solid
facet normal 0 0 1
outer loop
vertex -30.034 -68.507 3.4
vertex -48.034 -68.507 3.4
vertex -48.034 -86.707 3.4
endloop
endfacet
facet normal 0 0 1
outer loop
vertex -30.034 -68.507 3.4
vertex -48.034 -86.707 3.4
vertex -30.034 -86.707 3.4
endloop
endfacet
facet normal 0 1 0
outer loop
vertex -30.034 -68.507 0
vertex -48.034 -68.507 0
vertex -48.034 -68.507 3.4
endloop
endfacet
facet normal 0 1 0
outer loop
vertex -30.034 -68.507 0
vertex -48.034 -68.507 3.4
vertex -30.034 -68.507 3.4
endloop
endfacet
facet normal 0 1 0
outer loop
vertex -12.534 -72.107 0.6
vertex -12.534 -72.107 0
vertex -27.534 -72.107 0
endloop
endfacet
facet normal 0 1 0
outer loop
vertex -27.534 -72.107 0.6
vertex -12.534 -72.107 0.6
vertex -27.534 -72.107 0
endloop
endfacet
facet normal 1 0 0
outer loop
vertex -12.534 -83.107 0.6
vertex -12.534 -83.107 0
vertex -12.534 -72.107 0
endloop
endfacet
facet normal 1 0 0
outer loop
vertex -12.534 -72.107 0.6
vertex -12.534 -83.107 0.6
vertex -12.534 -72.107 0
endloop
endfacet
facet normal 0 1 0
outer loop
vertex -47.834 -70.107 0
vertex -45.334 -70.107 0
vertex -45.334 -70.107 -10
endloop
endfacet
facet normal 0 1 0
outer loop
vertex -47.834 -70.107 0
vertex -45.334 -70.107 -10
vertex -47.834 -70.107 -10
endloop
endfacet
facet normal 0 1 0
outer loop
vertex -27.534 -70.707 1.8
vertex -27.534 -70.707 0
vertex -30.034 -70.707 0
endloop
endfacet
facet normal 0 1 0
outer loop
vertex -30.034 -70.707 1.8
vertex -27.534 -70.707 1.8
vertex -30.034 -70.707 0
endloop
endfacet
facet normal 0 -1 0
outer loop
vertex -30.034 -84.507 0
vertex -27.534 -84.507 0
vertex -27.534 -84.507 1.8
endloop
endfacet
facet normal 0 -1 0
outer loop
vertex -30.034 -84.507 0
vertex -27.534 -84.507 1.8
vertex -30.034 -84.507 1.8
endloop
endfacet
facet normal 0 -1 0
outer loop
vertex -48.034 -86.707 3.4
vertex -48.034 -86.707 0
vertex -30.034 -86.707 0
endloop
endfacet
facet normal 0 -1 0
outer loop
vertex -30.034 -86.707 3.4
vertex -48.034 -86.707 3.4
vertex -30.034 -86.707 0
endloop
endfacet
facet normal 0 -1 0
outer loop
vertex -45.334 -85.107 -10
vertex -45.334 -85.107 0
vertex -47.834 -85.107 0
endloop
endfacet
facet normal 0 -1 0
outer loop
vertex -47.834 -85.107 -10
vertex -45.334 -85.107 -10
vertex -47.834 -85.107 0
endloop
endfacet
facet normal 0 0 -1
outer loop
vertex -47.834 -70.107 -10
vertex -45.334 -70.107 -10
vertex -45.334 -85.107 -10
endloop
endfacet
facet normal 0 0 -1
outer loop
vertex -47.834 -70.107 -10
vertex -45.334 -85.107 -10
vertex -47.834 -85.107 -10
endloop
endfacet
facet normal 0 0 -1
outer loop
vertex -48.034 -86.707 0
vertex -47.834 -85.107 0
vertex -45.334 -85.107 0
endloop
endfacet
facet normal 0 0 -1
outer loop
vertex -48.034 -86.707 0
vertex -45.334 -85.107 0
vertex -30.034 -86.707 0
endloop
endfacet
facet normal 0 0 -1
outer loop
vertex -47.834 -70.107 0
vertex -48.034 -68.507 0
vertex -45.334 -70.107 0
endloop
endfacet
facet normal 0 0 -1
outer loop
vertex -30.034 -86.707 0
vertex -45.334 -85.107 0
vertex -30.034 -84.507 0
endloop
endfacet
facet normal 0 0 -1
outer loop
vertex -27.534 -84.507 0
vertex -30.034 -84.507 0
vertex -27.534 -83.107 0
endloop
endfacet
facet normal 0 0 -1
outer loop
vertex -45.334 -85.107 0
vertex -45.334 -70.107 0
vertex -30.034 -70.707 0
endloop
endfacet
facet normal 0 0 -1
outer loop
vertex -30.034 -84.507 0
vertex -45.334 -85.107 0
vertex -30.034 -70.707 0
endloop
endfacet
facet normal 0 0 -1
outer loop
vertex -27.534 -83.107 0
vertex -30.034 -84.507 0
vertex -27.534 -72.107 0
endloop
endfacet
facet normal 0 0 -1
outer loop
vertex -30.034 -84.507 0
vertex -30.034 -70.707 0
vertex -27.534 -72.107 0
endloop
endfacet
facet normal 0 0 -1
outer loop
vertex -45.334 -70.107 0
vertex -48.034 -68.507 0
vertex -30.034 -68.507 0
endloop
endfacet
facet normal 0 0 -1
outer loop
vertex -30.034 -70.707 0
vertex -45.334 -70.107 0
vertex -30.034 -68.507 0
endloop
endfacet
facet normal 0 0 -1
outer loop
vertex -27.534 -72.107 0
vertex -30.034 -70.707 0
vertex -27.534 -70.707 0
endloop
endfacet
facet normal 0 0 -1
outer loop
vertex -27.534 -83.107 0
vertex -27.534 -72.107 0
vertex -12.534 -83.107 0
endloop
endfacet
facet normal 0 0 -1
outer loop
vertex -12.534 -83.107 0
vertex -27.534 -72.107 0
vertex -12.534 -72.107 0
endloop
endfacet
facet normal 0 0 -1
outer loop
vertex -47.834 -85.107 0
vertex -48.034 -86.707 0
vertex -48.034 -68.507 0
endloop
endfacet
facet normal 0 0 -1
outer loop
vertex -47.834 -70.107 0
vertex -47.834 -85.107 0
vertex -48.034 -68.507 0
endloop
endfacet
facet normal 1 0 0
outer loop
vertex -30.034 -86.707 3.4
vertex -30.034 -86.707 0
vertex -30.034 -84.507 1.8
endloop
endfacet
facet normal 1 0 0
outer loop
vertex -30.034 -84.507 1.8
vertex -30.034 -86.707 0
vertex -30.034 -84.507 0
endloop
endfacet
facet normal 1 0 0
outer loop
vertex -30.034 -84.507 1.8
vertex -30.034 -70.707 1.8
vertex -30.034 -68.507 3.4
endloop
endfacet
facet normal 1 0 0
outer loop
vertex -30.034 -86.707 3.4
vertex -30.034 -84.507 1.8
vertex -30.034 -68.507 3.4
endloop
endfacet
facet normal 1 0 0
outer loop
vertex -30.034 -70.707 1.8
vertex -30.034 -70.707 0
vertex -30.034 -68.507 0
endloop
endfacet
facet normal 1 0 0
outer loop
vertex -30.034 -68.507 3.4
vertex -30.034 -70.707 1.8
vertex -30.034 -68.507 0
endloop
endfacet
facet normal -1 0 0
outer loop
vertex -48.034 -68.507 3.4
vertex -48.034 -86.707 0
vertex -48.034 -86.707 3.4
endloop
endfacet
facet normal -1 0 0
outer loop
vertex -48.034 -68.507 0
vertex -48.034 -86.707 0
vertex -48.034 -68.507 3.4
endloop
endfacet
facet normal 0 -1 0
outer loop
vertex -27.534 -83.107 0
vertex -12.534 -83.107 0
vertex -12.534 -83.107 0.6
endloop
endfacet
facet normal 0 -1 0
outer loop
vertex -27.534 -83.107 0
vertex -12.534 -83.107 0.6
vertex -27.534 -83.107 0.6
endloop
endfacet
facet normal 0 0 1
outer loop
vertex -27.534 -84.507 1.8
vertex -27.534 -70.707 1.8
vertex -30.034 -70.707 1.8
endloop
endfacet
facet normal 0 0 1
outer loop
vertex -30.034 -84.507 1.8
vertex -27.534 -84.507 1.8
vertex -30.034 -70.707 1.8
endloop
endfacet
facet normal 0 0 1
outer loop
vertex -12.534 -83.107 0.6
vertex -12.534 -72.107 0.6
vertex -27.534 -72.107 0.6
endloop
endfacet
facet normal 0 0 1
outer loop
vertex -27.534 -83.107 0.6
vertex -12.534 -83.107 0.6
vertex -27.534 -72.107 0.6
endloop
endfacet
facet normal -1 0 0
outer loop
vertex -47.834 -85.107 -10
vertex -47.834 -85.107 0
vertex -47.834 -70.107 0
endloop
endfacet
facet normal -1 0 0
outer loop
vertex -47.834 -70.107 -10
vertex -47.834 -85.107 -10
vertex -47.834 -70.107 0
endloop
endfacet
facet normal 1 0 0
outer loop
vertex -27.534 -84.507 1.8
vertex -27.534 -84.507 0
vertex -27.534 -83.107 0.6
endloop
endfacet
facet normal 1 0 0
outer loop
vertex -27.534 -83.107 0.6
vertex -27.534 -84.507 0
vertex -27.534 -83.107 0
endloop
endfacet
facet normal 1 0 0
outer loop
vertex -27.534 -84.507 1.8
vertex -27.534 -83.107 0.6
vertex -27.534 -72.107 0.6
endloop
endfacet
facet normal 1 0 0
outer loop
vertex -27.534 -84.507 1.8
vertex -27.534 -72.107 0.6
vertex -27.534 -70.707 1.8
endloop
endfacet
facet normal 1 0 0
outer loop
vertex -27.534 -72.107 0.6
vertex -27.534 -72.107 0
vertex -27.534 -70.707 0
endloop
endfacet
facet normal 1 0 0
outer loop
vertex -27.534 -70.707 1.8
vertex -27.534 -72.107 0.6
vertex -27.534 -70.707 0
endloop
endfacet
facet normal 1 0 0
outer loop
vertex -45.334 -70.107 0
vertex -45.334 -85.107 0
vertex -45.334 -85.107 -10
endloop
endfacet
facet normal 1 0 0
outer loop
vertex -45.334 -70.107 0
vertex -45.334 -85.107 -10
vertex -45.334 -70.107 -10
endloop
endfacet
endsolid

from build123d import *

# Parameters (mm, degrees)
SKETCH_1_W      = 18
SKETCH_1_H      = 18.2
EXTRUDE_1_DEPTH = 3.4
SKETCH_2_W      = 2.5
SKETCH_2_H      = 15
EXTRUDE_2_DEPTH = 10
SKETCH_3_W      = 2.5
SKETCH_3_H      = 13.8
EXTRUDE_3_DEPTH = 1.8
SKETCH_4_W      = 15
SKETCH_4_H      = 11
EXTRUDE_4_DEPTH = 0.6


with BuildPart() as part:
    # 草圖1 → 填料-伸長1 (new body)
    with BuildSketch(Plane.XY):
        with Locations((-39.034480155, -77.607444045)):
            Rectangle(SKETCH_1_W, SKETCH_1_H)
    extrude(amount=EXTRUDE_1_DEPTH)

    # 草圖2 → 填料-伸長2 (add)
    with BuildSketch(Plane(origin=(0, 0, 0), x_dir=(-1, 0, 0), z_dir=(0, 0, -1))):
        with Locations((46.584480155, -77.607444045)):
            Rectangle(SKETCH_2_W, SKETCH_2_H)
    extrude(amount=EXTRUDE_2_DEPTH)

    # 草圖3 → 填料-伸長3 (add)
    with BuildSketch(Plane(origin=(0, 0, 0), x_dir=(-1, 0, 0), z_dir=(0, 0, -1))):
        with Locations((28.784480155, -77.607444045)):
            Rectangle(SKETCH_3_W, SKETCH_3_H)
    extrude(amount=-EXTRUDE_3_DEPTH)

    # 草圖4 → 填料-伸長4 (add)
    with BuildSketch(Plane(origin=(0, 0, 0), x_dir=(-1, 0, 0), z_dir=(0, 0, -1))):
        with Locations((20.034480155, -77.607444045)):
            Rectangle(SKETCH_4_W, SKETCH_4_H)
    extrude(amount=-EXTRUDE_4_DEPTH)


solid = part.part
